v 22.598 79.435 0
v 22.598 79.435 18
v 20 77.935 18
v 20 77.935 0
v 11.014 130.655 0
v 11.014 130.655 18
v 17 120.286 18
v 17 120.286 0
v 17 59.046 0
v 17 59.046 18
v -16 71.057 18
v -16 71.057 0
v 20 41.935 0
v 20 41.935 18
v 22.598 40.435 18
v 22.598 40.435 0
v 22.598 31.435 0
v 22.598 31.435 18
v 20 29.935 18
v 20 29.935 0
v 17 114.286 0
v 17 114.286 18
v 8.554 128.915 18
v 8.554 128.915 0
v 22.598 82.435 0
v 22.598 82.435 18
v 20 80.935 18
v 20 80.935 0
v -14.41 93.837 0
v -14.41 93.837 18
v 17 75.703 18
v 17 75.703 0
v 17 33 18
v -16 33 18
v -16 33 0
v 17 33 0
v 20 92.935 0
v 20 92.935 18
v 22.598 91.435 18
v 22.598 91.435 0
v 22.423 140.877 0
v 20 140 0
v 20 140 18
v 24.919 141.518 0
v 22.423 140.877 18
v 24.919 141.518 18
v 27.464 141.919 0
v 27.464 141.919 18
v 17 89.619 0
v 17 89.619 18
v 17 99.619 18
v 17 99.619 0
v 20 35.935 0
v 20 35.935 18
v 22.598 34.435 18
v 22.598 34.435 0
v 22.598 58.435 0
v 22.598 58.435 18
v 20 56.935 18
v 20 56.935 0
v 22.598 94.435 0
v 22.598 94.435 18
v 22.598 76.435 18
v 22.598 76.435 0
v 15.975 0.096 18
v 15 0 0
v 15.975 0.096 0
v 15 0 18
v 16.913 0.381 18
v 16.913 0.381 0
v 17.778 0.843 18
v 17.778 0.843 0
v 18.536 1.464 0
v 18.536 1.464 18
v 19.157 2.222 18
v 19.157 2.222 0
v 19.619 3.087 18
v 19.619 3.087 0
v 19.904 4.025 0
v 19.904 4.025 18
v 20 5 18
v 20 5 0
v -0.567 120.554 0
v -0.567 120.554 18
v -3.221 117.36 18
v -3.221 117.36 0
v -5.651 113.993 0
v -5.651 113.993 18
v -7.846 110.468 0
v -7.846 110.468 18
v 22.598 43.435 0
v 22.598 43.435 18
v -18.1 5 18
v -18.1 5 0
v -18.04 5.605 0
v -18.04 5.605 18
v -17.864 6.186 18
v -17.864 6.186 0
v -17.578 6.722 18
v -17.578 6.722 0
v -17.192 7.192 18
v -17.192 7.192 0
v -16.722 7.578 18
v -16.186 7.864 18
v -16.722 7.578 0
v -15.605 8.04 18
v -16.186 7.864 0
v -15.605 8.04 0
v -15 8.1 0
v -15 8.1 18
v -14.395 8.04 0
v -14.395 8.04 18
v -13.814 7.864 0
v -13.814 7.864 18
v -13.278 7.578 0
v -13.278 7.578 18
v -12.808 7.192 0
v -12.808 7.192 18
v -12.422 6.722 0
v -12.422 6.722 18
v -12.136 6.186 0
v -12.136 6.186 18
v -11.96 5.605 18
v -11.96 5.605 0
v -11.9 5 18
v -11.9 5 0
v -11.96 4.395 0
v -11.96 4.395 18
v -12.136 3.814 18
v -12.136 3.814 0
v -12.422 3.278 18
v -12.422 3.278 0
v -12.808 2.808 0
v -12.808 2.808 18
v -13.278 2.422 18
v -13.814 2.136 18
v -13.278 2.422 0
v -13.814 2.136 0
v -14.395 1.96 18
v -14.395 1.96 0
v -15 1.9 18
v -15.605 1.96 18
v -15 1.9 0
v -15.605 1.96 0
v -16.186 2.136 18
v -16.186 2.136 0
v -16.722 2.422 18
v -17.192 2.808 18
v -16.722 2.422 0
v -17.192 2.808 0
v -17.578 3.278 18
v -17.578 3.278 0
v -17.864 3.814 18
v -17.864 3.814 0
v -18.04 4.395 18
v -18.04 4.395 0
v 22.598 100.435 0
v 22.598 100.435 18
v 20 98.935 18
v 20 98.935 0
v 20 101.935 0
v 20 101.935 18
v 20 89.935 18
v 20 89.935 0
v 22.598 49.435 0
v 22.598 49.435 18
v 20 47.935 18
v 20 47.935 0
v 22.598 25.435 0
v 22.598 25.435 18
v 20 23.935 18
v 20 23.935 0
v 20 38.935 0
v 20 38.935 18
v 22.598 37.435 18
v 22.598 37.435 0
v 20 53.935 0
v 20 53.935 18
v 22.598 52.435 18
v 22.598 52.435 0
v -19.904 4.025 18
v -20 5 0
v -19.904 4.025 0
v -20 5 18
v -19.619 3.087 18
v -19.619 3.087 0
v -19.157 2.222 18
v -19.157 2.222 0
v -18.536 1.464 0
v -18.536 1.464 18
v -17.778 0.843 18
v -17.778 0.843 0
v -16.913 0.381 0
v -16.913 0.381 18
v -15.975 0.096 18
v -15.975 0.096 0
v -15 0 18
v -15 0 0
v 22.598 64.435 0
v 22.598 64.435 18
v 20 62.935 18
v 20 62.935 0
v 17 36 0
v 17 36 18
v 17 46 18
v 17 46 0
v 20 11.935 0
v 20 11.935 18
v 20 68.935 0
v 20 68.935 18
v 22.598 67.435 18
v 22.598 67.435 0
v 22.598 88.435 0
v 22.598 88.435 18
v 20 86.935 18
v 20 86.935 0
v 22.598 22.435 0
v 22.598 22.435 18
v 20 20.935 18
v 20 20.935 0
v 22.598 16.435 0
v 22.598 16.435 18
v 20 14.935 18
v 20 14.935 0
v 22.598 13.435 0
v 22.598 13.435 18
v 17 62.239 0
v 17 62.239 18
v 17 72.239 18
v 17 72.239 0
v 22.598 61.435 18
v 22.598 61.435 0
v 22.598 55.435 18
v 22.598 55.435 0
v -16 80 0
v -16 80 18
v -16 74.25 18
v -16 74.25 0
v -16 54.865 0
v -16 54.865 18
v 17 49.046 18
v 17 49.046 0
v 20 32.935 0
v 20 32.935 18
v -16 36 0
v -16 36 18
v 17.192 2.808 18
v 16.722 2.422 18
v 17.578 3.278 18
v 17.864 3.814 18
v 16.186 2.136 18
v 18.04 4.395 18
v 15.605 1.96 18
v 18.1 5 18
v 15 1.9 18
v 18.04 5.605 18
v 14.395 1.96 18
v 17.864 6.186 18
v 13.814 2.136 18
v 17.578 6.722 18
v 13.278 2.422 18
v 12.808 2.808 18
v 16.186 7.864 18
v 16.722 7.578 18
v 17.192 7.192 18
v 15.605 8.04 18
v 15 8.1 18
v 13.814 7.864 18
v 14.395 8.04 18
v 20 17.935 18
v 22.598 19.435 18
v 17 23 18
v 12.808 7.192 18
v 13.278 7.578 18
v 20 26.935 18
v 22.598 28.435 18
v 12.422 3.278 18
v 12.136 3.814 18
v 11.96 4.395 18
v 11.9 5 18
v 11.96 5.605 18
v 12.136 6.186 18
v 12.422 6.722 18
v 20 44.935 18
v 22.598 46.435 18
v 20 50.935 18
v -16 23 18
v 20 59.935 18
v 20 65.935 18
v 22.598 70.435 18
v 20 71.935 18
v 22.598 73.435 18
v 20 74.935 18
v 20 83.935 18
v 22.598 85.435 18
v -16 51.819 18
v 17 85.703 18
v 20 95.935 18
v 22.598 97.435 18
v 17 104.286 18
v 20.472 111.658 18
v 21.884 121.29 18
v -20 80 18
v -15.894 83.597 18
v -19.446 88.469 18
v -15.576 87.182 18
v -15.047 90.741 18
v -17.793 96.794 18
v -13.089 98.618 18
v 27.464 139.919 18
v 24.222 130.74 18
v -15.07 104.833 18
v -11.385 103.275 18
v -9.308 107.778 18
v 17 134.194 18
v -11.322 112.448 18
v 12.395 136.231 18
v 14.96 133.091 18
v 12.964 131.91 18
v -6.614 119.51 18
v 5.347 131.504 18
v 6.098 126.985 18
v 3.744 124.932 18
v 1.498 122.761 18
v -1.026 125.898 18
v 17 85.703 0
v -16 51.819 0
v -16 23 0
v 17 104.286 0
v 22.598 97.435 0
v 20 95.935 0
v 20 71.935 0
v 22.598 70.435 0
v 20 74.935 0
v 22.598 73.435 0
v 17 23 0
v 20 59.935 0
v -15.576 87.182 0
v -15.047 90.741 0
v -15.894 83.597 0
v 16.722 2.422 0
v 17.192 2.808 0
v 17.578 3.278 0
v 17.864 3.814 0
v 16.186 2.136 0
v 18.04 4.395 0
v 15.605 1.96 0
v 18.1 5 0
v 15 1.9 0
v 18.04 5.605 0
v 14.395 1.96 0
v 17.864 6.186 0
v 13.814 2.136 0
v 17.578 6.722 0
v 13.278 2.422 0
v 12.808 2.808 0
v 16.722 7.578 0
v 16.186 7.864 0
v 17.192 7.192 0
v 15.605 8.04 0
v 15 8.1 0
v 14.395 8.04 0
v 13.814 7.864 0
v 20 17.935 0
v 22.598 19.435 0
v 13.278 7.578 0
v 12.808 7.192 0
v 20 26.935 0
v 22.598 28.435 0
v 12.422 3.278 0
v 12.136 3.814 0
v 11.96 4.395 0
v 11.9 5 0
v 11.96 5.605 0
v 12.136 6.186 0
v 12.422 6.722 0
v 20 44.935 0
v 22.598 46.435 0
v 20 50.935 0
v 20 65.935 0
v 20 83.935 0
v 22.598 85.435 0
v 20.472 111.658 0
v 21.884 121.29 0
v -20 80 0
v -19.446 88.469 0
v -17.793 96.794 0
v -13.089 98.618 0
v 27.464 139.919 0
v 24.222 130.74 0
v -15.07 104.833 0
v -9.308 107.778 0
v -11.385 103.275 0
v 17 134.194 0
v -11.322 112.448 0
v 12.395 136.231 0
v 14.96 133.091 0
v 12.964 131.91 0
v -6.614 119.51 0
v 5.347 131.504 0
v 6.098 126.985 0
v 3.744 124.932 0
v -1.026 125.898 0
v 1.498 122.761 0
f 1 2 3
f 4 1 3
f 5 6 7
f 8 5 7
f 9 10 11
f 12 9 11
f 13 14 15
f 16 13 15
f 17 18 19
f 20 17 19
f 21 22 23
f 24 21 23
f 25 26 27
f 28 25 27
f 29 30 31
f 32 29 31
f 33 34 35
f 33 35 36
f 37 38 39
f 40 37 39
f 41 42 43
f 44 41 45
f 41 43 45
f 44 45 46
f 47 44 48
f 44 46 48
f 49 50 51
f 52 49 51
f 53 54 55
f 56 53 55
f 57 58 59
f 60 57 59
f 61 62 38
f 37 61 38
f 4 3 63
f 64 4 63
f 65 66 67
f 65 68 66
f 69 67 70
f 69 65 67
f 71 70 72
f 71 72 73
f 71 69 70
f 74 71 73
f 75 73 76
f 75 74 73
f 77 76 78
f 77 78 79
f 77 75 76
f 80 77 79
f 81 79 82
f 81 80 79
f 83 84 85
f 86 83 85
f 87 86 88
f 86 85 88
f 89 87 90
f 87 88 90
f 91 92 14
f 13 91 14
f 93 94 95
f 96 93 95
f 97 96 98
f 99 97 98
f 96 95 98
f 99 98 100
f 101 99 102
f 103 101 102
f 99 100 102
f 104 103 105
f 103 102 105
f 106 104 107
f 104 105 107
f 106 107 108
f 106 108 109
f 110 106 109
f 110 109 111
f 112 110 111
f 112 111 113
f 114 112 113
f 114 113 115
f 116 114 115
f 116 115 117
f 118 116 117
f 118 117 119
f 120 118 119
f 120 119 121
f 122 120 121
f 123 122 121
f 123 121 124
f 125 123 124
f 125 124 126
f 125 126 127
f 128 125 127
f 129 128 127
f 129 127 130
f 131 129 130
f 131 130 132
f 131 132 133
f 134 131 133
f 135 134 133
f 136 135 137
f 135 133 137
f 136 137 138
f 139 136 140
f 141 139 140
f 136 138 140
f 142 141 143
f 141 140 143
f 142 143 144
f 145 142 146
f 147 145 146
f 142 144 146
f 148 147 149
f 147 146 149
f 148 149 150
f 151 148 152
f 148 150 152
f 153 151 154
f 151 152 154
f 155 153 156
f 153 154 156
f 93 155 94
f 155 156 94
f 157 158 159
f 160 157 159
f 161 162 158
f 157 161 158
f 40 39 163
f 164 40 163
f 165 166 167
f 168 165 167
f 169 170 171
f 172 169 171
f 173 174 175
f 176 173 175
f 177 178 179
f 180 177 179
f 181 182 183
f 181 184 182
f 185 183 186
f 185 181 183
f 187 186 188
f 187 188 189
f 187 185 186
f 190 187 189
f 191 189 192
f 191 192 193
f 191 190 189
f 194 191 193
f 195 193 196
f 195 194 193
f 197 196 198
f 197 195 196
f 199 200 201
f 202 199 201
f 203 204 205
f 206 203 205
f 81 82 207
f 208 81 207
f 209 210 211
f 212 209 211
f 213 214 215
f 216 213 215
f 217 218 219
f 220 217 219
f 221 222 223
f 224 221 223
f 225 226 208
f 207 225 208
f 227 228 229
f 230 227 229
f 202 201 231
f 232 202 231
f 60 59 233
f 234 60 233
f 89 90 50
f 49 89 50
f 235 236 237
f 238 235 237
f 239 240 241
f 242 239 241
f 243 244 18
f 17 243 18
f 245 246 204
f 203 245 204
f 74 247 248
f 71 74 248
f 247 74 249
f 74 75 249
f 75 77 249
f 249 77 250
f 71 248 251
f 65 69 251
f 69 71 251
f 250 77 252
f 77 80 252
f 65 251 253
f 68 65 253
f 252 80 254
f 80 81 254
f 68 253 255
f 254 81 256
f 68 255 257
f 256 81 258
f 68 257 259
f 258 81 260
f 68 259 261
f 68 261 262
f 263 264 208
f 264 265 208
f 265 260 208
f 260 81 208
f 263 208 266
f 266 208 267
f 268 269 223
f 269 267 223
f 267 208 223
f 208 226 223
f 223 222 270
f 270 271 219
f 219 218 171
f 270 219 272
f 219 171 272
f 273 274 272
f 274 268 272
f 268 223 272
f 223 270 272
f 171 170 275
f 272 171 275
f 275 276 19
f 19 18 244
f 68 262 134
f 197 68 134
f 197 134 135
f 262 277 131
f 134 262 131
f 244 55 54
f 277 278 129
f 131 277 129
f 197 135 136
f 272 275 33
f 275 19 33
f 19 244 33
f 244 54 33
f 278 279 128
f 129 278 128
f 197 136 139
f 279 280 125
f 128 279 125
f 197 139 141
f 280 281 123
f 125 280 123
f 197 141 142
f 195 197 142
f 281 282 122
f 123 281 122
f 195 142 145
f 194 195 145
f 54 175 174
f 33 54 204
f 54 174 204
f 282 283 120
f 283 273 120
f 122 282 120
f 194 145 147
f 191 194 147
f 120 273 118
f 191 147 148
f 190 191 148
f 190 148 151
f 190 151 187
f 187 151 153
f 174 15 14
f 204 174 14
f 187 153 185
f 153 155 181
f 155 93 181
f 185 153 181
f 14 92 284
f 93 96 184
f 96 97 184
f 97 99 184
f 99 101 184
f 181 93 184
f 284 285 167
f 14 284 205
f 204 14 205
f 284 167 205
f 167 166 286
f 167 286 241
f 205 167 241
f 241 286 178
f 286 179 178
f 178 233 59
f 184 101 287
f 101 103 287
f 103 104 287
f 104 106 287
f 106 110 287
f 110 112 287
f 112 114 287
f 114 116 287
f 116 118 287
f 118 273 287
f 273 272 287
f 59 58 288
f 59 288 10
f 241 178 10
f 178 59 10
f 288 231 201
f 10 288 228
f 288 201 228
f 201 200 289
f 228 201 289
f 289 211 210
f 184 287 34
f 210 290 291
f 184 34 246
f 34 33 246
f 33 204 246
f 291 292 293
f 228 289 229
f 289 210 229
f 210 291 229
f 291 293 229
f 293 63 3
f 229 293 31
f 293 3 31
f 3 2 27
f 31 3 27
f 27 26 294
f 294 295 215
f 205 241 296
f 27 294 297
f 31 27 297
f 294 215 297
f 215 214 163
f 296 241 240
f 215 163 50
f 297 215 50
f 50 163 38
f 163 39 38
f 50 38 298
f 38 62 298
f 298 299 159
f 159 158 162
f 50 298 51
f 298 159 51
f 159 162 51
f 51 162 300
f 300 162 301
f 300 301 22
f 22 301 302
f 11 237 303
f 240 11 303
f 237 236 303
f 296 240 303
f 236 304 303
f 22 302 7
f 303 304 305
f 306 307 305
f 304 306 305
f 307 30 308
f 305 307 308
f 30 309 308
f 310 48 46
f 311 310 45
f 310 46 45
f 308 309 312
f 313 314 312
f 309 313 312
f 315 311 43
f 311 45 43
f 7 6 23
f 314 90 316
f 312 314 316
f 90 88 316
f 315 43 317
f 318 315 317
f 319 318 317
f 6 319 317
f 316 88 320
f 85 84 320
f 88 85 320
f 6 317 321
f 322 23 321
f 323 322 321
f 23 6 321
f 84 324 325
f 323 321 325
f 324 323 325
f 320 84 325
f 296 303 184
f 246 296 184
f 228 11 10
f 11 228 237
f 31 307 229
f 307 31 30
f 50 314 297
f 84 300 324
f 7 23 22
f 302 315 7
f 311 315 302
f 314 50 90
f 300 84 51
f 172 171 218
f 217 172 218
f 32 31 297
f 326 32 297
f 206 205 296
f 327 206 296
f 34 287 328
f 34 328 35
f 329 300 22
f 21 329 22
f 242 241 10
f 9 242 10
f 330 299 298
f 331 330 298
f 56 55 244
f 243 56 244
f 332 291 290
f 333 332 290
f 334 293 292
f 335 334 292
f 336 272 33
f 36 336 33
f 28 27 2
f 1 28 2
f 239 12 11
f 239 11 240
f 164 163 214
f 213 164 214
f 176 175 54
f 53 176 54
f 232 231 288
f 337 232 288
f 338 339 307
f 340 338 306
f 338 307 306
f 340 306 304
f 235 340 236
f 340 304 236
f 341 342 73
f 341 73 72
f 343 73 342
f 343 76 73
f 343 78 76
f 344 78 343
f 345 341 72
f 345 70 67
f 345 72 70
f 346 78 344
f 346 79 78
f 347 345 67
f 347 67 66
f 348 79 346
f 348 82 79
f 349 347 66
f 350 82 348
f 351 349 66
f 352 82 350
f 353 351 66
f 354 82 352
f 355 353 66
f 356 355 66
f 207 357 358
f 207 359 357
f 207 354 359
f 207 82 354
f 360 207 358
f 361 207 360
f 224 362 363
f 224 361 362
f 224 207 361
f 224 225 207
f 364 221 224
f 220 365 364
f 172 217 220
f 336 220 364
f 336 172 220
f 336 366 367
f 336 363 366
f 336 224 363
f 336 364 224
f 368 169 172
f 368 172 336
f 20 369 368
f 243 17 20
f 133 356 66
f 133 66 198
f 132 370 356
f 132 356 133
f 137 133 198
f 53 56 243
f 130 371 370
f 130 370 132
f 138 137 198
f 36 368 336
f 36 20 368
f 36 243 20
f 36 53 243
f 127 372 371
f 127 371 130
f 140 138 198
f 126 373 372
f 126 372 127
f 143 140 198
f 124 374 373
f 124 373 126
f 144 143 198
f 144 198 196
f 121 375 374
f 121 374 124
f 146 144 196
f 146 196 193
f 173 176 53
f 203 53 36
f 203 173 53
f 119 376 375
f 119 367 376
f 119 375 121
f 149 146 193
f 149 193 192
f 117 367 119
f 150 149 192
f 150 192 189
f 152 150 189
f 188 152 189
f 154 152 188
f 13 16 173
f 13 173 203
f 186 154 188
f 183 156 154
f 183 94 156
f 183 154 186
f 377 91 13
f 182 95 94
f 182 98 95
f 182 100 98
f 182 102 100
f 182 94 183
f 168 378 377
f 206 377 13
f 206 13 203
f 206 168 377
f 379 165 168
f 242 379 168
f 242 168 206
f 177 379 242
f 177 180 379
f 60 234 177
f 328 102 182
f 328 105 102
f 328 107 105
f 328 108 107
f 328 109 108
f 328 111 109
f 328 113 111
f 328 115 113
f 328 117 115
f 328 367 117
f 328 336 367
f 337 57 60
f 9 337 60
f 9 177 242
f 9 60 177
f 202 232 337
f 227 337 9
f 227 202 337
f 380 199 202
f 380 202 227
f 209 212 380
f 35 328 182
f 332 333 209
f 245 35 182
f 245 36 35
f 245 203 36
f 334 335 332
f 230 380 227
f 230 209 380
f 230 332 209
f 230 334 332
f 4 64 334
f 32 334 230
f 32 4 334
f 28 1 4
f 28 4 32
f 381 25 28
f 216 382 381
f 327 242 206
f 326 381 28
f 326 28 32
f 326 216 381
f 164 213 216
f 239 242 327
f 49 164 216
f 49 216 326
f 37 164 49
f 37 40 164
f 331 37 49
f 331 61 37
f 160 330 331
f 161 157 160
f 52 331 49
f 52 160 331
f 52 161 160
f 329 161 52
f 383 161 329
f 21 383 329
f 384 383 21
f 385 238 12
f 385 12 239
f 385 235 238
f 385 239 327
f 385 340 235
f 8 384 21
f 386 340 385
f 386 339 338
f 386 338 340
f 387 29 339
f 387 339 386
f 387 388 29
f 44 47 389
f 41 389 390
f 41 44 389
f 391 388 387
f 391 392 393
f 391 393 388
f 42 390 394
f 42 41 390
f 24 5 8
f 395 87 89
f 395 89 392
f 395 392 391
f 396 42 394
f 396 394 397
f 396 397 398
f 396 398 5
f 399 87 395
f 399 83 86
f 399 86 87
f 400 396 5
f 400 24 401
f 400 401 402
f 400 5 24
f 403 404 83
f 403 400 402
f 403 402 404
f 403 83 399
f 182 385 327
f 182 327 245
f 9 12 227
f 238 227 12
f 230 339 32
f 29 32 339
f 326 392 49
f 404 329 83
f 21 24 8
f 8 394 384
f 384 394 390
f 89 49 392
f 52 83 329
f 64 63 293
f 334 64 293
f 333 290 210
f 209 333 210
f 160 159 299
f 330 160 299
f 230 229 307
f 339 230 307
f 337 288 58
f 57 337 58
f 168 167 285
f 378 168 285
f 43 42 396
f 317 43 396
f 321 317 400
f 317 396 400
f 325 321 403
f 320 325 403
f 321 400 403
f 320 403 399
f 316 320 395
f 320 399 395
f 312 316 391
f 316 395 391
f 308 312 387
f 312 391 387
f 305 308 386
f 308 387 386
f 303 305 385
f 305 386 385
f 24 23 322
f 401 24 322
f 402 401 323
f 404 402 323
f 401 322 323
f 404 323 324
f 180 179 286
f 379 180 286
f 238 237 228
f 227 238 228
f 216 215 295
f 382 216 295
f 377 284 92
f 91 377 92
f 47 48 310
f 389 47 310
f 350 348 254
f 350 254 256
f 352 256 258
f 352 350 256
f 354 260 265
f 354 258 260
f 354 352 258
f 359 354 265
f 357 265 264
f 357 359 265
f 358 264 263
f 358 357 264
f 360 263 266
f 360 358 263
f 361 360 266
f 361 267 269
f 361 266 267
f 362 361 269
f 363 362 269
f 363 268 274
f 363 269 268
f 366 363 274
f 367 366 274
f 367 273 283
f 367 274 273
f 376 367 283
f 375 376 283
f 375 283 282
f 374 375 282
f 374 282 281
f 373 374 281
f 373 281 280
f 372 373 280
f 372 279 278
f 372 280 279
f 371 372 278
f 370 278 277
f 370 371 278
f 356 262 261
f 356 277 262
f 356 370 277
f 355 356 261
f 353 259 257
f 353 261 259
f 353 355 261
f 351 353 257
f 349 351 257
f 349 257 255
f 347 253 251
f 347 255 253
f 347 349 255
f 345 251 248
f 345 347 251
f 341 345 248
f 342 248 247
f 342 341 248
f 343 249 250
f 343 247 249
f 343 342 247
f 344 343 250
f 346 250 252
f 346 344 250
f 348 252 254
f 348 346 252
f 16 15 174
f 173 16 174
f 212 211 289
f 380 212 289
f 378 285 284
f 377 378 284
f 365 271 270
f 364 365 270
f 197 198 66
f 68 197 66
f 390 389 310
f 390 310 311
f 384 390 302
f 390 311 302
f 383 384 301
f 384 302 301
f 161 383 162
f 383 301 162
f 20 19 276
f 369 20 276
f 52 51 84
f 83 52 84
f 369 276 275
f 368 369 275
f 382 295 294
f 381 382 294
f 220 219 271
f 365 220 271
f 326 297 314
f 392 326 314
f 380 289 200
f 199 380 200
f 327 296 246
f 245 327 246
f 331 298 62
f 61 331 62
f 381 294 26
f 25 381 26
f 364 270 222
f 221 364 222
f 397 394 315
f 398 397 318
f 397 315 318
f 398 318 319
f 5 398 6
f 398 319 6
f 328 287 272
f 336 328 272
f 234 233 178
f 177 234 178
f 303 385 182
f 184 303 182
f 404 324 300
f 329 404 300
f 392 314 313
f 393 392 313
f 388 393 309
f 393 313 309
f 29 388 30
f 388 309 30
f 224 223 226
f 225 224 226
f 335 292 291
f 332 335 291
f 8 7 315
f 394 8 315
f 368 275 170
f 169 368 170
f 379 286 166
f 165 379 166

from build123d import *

# Parameters (mm, degrees)
BOSS_EXTRUDE1_DEPTH     = 18
SKETCH3_W               = 33
SKETCH3_H               = 10
CUT_EXTRUDE1_DEPTH      = 143.562267098
CUT_EXTRUDE2_DEPTH      = 143.562267098
CUT_EXTRUDE3_DEPTH      = 143.562267098
CUT_EXTRUDE4_DEPTH      = 143.562267098
BOSS_EXTRUDE2_DEPTH     = 18
BOSS_EXTRUDE3_DEPTH     = 18
LPATTERN1_COUNT         = 30
LPATTERN1_PITCH         = 3
CUT_EXTRUDE5_DEPTH      = 146.668613805
CUT_EXTRUDE6_DEPTH      = 146.668613805
CUT_EXTRUDE7_DEPTH      = 146.668613805
CUT_EXTRUDE8_DEPTH      = 146.668613805
FILLET1_R               = 5
F_6_0_MM_DOWEL_HOLES1_D = 6.2


with BuildPart() as part:
    # Sketch2 → Boss-Extrude1 (new body)
    with BuildSketch(Plane.XY):
        with BuildLine():
            Line((-20, 0), (20, 0))
            Line((20, 0), (20, 140))
            ThreePointArc((20, 140), (-9.083269132, 116.055512755), (-20, 80))
            Line((-20, 80), (-20, 0))
        make_face()
    extrude(amount=BOSS_EXTRUDE1_DEPTH)

    # Sketch3 → Cut-Extrude1 (cut, through all)
    with BuildSketch(Plane.XY.offset(18)):
        with Locations((0.5, 28)):
            Rectangle(SKETCH3_W, SKETCH3_H)
    extrude(amount=-CUT_EXTRUDE1_DEPTH, mode=Mode.SUBTRACT)

    # Sketch4 → Cut-Extrude2 (cut, through all)
    with BuildSketch(Plane.XY.offset(18)):
        Polygon((-16, 36), (17, 36), (17, 46), (-16, 51.818790363), align=None)
    extrude(amount=-CUT_EXTRUDE2_DEPTH, mode=Mode.SUBTRACT)

    # Sketch5 → Cut-Extrude3 (cut, through all)
    with BuildSketch(Plane.XY.offset(18)):
        Polygon((-16, 54.865070199), (17, 49.046279836), (17, 59.046279836), (-16, 71.057297566), align=None)
    extrude(amount=-CUT_EXTRUDE3_DEPTH, mode=Mode.SUBTRACT)

    # Sketch6 → Cut-Extrude4 (cut, through all)
    with BuildSketch(Plane.XY.offset(18)):
        with BuildLine():
            Line((-16, 74.249830884), (17, 62.238813153))
            Line((17, 62.238813153), (17, 72.238813153))
            Line((17, 72.238813153), (-15.046889298, 90.741093316))
            ThreePointArc((-15.046889298, 90.741093316), (-15.761255119, 85.391648765), (-16, 80))
            Line((-16, 80), (-16, 74.249830884))
        make_face()
    extrude(amount=-CUT_EXTRUDE4_DEPTH, mode=Mode.SUBTRACT)

    # Sketch13 → Boss-Extrude2 (add)
    with BuildSketch(Plane.XY.offset(18)):
        with BuildLine():
            Line((27.463865989, 141.919276749), (27.463865989, 139.919276749))
            ThreePointArc((27.463865989, 139.919276749), (21.883638711, 121.290161062), (20, 101.934676234))
            Line((20, 101.934676234), (20, 140))
            ThreePointArc((20, 140), (23.663152719, 141.227117654), (27.463865989, 141.919276749))
        make_face()
    extrude(amount=-BOSS_EXTRUDE2_DEPTH)

    # Sketch15 → Boss-Extrude3 (add)
    with BuildSketch(Plane.XY.offset(18)):
        Polygon((20, 101.934676234), (22.598076211, 100.434676234), (20, 98.934676234), align=None)
    boss_extrude3 = extrude(amount=-BOSS_EXTRUDE3_DEPTH)

    # LPattern1: Boss-Extrude3 ×30
    with Locations(*[(0, -i * LPATTERN1_PITCH, 0) for i in range(1, LPATTERN1_COUNT)]):
        add(boss_extrude3)

    # Sketch17 → Cut-Extrude5 (cut, through all)
    with BuildSketch(Plane.XY.offset(18)):
        with BuildLine():
            Line((-14.409820926, 93.837383335), (17, 75.702914768))
            Line((17, 75.702914768), (17, 85.702914768))
            Line((17, 85.702914768), (-9.308172311, 107.778092451))
            ThreePointArc((-9.308172311, 107.778092451), (-12.284651864, 100.963507838), (-14.409820926, 93.837383335))
        make_face()
    extrude(amount=-CUT_EXTRUDE5_DEPTH, mode=Mode.SUBTRACT)

    # Sketch18 → Cut-Extrude6 (cut, through all)
    with BuildSketch(Plane.XY.offset(18)):
        with BuildLine():
            Line((-7.846238812, 110.46760646), (17, 89.619136636))
            Line((17, 89.619136636), (17, 99.619136636))
            Line((17, 99.619136636), (-0.566824758, 120.554463152))
            ThreePointArc((-0.566824758, 120.554463152), (-4.464319866, 115.697073553), (-7.846238812, 110.46760646))
        make_face()
    extrude(amount=-CUT_EXTRUDE6_DEPTH, mode=Mode.SUBTRACT)

    # Sketch19 → Cut-Extrude7 (cut, through all)
    with BuildSketch(Plane.XY.offset(18)):
        with BuildLine():
            Line((1.497556464, 122.761400894), (17, 104.286308117))
            Line((17, 104.286308117), (17, 114.286308117))
            Line((17, 114.286308117), (8.554035532, 128.915147695))
            ThreePointArc((8.554035532, 128.915147695), (4.907555132, 125.973860666), (1.497556464, 122.761400894))
        make_face()
    extrude(amount=-CUT_EXTRUDE7_DEPTH, mode=Mode.SUBTRACT)

    # Sketch21 → Cut-Extrude8 (cut, through all)
    with BuildSketch(Plane.XY.offset(18)):
        with BuildLine():
            Line((11.013641865, 130.654984559), (17, 120.286308117))
            Line((17, 120.286308117), (17, 134.194095619))
            ThreePointArc((17, 134.194095619), (13.956345649, 132.509918344), (11.013641865, 130.654984559))
        make_face()
    extrude(amount=-CUT_EXTRUDE8_DEPTH, mode=Mode.SUBTRACT)

    # Fillet1
    fillet1_edges = [part.edges().sort_by_distance(p)[0] for p in [
        (20, 0, 9),
        (-20, 0, 9),
    ]]
    fillet(fillet1_edges, radius=FILLET1_R)

    # Ø6.0 mm Dowel Holes1 (through all)
    with Locations(Plane.XY.offset(18)):
        with Locations((-15, 5)):
            f_6_0_mm_dowel_holes1 = Hole(F_6_0_MM_DOWEL_HOLES1_D / 2)

    # Mirror1: Ø6.0 mm Dowel Holes1 across plane
    add(f_6_0_mm_dowel_holes1.mirror(Plane(origin=(0, 0, 0), x_dir=(0, 0, 1), z_dir=(1, 0, 0))), mode=Mode.SUBTRACT)


solid = part.part
